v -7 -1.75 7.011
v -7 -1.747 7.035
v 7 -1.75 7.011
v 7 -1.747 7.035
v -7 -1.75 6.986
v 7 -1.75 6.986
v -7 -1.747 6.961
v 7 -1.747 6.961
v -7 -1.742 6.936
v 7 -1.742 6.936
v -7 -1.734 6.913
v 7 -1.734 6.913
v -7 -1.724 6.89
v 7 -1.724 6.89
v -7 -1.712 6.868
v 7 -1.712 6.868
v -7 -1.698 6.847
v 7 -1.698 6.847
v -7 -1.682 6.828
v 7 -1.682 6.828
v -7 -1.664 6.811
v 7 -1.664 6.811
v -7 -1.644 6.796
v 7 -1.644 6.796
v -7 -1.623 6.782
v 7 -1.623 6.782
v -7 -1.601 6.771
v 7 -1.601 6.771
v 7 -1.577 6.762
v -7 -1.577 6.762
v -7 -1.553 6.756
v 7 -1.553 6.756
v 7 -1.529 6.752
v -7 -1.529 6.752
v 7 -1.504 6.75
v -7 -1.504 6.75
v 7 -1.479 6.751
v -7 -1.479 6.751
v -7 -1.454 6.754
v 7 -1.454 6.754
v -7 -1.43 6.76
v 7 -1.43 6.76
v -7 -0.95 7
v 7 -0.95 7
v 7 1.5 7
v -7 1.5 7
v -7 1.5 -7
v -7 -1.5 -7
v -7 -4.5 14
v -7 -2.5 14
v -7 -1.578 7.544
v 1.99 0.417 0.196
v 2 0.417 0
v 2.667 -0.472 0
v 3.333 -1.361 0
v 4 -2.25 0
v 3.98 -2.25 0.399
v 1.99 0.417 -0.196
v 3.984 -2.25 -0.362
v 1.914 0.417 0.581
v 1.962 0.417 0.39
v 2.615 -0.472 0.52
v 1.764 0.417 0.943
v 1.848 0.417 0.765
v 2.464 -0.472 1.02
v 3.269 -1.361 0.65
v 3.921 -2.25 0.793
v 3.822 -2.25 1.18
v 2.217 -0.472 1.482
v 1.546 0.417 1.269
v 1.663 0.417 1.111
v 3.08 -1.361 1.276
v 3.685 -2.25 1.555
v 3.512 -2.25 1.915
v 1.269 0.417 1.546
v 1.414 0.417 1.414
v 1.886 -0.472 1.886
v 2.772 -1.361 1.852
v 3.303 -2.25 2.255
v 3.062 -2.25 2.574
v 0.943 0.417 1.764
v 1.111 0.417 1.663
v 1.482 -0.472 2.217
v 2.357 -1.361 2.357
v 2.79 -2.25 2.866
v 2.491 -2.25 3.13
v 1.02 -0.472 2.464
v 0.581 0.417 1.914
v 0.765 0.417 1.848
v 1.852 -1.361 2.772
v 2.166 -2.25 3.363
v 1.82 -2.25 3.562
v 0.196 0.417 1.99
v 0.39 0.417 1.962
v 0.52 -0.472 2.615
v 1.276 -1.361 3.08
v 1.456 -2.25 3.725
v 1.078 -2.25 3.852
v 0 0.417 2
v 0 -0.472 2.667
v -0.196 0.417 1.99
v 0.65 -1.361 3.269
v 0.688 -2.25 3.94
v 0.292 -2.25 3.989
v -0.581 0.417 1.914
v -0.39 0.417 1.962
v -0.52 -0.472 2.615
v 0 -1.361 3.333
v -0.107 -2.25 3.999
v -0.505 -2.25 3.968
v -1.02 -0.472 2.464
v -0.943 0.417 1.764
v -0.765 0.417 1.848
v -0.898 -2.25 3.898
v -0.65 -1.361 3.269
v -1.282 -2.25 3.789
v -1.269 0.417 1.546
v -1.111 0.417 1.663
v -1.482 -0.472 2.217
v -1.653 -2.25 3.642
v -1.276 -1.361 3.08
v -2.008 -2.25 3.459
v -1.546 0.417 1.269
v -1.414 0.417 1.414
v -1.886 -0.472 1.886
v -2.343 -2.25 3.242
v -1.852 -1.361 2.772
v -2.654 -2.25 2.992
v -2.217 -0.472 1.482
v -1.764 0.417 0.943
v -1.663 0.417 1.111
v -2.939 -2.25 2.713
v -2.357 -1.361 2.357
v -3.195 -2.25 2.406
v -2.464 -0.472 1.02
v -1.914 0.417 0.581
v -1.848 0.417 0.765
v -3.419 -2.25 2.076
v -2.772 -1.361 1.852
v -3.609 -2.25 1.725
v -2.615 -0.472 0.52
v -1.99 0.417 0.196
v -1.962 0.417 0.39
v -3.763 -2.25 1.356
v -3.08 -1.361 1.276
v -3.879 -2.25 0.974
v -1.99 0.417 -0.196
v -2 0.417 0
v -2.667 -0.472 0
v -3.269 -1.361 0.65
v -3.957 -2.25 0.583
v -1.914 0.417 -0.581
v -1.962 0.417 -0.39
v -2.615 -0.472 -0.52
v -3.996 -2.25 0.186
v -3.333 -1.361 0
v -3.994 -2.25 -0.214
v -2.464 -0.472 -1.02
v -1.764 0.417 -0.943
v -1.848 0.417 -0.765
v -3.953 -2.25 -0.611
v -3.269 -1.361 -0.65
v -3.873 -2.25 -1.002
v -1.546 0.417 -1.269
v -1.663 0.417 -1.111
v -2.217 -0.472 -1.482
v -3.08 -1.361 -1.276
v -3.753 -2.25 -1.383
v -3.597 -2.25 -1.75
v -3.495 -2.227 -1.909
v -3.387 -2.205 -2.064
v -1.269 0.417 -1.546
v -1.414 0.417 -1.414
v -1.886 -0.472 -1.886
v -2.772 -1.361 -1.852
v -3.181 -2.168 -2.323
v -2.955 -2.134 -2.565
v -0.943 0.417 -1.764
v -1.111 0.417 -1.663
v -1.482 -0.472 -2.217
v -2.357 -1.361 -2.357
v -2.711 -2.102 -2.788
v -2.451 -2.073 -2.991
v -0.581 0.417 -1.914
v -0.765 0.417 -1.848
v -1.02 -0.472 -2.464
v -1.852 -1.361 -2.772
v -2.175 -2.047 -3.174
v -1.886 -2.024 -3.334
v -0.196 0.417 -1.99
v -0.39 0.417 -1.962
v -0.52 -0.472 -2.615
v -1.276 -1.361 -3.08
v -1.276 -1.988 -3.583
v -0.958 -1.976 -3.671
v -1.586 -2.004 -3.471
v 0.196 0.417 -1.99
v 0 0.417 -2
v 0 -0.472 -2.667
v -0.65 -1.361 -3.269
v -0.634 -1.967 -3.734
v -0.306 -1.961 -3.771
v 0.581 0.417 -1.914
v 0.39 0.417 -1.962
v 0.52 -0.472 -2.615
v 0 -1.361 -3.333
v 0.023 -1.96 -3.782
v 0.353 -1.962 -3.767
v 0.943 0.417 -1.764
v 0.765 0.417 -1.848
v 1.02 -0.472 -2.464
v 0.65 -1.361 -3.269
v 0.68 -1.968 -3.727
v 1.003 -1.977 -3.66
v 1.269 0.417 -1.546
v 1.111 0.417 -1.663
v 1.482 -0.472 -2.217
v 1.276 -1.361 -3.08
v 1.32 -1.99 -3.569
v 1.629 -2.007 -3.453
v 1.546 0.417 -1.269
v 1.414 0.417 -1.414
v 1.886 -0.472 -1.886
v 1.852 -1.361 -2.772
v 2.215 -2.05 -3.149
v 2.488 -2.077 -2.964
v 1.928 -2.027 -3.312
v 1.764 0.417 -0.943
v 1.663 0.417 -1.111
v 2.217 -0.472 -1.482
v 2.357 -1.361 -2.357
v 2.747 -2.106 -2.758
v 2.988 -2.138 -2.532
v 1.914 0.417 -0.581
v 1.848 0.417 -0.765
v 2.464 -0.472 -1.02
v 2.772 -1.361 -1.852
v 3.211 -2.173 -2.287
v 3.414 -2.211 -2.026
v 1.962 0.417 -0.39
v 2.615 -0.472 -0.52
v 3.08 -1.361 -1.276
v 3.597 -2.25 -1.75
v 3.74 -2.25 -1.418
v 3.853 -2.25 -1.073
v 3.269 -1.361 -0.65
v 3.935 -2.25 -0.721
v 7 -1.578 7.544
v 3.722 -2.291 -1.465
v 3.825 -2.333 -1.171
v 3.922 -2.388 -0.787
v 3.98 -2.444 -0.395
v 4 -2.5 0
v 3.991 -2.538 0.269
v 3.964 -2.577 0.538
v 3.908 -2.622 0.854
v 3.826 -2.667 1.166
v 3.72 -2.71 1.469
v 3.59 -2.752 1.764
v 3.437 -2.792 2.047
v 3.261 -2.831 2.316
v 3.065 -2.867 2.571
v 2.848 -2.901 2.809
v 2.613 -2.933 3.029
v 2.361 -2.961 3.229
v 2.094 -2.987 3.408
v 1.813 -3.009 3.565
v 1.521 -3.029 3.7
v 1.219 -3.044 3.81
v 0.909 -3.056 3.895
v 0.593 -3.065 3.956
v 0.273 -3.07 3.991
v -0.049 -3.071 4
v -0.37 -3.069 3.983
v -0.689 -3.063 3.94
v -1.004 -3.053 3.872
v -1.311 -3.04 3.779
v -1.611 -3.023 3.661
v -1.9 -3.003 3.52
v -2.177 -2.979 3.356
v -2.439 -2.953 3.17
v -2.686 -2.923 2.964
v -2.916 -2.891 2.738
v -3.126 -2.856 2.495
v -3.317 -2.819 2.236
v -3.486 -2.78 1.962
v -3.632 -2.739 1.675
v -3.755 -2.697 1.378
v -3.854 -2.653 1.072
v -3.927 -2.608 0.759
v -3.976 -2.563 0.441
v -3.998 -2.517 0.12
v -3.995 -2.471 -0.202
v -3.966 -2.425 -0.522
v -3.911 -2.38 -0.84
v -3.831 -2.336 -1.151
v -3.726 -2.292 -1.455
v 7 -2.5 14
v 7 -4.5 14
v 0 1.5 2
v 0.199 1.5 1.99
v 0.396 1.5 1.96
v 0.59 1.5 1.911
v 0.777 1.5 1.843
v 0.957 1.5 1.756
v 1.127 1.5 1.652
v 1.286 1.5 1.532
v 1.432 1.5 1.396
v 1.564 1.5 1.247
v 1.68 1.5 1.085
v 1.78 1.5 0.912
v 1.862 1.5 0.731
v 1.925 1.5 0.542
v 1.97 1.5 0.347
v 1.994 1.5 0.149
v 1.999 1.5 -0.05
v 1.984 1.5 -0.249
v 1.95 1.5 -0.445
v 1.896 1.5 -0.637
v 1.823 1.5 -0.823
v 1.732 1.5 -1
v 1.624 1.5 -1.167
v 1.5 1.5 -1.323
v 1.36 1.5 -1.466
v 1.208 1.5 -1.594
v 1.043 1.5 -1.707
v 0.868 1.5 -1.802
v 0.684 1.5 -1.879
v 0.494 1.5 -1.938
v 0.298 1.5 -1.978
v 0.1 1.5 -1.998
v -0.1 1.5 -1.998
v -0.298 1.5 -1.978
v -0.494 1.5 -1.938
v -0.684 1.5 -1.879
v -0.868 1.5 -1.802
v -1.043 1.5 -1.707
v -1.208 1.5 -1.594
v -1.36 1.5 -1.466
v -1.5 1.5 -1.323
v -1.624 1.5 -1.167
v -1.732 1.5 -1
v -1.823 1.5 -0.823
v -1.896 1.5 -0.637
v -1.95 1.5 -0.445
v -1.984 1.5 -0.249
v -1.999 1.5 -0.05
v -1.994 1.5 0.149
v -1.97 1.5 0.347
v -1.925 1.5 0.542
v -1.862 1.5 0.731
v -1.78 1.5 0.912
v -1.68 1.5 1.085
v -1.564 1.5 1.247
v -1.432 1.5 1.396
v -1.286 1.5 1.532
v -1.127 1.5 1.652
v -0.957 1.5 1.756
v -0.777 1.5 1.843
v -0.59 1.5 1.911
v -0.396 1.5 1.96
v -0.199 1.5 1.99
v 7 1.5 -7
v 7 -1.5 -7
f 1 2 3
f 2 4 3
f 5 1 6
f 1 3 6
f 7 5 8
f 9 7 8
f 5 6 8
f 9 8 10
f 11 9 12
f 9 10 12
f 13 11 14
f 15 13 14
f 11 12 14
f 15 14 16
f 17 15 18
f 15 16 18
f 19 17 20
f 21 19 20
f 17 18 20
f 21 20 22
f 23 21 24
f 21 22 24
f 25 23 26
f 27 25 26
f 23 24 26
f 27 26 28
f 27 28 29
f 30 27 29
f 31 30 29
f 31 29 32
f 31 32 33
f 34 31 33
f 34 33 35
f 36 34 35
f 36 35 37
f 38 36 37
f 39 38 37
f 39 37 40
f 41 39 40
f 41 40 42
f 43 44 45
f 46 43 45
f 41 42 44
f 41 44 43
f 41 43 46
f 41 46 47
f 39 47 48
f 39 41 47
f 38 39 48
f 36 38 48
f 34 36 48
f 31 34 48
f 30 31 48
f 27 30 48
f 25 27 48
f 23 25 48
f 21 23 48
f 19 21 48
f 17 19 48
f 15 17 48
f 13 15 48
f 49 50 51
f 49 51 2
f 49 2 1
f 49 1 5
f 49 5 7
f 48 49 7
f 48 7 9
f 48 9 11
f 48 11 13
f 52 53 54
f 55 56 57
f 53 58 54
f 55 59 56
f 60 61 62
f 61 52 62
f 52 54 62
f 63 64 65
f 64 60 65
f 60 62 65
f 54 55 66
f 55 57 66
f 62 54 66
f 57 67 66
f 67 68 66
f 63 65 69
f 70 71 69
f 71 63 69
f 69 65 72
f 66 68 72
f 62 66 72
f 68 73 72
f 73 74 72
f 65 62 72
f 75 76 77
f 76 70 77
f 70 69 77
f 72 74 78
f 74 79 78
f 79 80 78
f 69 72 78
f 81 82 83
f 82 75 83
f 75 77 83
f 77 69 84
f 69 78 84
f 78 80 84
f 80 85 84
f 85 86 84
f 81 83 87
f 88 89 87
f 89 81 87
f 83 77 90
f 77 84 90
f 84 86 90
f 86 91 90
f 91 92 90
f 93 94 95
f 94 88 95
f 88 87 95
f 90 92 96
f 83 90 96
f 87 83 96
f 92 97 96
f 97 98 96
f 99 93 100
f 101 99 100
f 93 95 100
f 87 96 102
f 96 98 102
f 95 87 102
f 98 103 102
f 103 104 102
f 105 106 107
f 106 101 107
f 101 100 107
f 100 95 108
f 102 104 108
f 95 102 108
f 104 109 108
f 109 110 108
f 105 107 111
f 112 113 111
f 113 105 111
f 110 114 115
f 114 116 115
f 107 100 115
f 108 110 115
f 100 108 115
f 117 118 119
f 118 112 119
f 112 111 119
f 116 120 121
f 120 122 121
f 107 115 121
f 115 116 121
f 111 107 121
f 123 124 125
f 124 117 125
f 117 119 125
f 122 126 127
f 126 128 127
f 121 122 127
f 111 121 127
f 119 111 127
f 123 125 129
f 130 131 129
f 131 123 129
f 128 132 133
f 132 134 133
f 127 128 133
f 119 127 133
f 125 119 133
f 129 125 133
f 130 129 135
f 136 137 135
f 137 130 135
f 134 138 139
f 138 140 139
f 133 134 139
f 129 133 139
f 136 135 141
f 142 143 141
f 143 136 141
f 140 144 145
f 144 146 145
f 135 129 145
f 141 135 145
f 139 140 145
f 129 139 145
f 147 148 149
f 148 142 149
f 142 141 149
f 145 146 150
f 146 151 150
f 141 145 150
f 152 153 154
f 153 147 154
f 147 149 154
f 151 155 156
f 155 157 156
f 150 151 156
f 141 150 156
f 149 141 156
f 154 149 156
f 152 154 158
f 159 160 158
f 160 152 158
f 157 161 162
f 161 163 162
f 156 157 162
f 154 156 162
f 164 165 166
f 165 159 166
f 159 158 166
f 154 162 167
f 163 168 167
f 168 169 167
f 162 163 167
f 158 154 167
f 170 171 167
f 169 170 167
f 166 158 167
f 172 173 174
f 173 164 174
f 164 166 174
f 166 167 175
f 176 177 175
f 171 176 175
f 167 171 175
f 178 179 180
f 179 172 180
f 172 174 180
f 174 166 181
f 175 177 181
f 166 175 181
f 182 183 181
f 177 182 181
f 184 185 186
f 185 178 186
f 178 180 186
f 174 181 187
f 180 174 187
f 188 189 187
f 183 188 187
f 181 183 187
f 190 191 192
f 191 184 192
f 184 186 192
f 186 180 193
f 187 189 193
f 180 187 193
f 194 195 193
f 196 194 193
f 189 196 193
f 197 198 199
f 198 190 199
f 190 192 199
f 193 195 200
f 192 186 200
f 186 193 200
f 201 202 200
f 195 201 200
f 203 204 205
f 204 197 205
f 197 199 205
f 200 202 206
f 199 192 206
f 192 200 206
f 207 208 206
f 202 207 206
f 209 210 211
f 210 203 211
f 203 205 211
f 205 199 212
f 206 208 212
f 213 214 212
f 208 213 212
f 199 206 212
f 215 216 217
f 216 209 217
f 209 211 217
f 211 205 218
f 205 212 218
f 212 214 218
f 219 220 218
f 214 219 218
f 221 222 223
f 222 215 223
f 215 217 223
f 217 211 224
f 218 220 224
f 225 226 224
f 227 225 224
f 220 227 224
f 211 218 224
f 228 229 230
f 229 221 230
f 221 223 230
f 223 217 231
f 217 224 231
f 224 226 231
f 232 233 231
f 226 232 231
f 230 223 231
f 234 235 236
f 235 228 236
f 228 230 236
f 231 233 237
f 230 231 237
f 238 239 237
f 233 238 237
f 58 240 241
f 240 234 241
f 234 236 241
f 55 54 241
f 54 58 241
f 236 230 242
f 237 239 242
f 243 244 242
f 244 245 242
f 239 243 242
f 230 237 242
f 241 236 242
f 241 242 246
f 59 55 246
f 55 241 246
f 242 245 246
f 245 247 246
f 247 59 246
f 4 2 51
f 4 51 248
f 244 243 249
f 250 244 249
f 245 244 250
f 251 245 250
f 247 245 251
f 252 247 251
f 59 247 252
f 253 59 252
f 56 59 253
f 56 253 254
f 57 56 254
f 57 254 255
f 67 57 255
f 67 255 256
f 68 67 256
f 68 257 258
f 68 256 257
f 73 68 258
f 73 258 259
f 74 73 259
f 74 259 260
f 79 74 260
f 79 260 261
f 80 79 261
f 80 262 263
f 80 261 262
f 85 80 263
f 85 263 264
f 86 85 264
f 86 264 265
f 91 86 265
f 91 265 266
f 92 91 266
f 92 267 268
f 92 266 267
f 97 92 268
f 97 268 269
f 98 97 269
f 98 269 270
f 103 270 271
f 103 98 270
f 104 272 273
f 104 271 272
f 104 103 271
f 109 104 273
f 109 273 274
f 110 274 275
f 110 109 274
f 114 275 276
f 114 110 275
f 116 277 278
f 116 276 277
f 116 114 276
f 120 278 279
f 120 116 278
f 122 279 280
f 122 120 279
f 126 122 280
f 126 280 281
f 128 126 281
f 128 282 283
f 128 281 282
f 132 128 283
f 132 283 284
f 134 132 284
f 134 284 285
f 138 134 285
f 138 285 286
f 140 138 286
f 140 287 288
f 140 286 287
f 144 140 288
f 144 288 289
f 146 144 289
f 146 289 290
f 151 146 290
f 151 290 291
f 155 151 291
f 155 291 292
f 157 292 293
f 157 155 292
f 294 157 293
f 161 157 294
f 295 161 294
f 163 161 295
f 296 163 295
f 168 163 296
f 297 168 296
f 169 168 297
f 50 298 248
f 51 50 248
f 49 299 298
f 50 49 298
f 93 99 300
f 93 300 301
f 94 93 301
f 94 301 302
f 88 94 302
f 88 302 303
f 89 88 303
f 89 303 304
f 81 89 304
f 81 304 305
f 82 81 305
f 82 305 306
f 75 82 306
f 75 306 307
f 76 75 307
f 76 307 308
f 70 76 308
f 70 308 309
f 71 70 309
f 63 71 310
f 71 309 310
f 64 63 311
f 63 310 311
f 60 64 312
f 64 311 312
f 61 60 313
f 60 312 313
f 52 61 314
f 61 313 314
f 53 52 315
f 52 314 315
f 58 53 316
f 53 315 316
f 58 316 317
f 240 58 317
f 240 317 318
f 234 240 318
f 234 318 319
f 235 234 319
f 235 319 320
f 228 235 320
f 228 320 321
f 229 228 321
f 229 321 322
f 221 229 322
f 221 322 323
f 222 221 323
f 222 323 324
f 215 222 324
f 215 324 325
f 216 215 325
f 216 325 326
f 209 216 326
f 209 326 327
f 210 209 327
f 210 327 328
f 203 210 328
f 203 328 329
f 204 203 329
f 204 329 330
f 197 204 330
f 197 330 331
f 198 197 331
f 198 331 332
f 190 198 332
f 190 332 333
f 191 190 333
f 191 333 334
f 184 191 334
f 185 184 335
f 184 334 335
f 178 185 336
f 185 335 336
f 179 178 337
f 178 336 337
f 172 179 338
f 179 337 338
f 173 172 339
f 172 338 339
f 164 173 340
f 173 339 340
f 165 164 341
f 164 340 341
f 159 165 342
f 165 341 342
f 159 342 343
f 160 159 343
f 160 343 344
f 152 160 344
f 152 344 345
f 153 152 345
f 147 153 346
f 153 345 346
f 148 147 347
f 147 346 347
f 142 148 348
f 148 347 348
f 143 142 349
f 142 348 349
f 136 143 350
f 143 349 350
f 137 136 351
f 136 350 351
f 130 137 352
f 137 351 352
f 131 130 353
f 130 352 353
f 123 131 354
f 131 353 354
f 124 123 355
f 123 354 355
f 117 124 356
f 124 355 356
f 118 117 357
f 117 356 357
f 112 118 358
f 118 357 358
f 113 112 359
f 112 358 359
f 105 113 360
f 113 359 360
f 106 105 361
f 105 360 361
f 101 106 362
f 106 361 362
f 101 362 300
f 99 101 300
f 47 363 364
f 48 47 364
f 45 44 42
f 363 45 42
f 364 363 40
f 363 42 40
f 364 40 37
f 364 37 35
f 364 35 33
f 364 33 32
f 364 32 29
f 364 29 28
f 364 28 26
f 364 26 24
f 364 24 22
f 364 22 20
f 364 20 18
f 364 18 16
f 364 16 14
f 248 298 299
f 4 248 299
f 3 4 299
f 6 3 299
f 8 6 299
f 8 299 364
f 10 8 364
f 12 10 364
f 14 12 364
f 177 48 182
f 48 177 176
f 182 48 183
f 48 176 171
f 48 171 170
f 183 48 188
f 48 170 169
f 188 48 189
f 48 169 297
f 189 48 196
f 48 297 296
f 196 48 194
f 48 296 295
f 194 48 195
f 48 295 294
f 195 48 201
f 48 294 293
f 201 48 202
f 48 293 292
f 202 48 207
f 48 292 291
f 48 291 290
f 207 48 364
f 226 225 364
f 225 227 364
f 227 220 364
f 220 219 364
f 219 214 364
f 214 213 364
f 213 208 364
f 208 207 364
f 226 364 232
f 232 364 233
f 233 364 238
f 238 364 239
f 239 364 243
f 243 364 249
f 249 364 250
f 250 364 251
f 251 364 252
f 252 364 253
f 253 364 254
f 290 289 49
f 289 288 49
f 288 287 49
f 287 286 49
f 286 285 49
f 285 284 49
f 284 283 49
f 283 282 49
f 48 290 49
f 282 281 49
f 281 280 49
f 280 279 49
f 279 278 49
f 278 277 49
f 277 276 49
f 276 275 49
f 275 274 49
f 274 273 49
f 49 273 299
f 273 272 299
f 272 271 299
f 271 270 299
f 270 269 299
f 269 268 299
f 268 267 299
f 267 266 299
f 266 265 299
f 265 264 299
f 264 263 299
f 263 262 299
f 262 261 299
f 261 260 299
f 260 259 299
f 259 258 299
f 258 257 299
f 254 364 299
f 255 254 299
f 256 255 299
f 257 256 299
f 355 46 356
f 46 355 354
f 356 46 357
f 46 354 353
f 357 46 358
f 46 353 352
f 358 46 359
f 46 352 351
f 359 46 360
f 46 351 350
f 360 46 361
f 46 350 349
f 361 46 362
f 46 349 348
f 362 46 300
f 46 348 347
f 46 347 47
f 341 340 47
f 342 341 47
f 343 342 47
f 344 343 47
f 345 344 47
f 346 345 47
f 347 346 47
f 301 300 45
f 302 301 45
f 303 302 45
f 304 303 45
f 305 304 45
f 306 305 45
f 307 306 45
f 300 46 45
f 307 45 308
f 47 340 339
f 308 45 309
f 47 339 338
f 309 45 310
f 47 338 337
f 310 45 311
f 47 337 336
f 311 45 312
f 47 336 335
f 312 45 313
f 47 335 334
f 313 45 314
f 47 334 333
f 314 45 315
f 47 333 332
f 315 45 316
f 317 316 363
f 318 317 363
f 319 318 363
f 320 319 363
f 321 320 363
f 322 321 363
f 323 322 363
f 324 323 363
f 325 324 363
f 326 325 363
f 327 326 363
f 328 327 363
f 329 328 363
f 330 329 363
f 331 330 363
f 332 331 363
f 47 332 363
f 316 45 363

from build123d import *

# Parameters (mm, degrees)
SKETCH003_R     = 1.75
SKETCH004_R     = 4
SKETCH005_R     = 4
PAD001_DEPTH    = 2
PAD_DEPTH       = 7
SKETCH001_R     = 0.25
POCKET_DEPTH    = 14.001
SKETCH002_R     = 2
POCKET001_DEPTH = 6.001
CHAMFER_SIZE    = 0.3


with BuildPart() as schraubenkopf:
    # Sketch003 → Loft section 0
    with BuildSketch(Plane.XZ.offset(-0.75)):
        Circle(SKETCH003_R)
    # Sketch004 → Loft section 1
    with BuildSketch(Plane.XZ.offset(2.25)):
        Circle(SKETCH004_R)
    loft()

    # Sketch005 → Pad001 (new body)
    with BuildSketch(Plane.XZ.offset(2.25)):
        Circle(SKETCH005_R)
    extrude(amount=PAD001_DEPTH)


with BuildPart() as halterung_unten:
    # Sketch → Pad (new body, symmetric)
    with BuildSketch(Plane.YZ):
        Polygon((-4.5, 14), (-2.5, 14), (-1.5, 7), (1.5, 7), (1.5, -7), (-1.5, -7), align=None)
    extrude(amount=PAD_DEPTH, both=True)

    # Sketch001 → Pocket (cut, through all)
    with BuildSketch(Plane.YZ.offset(7)):
        with Locations((-1.5, 7)):
            Circle(SKETCH001_R)
    extrude(amount=-POCKET_DEPTH, mode=Mode.SUBTRACT)

    # Sketch002 → Pocket001 (cut, through all)
    with BuildSketch(Plane.ZX.offset(1.5)):
        Circle(SKETCH002_R)
    extrude(amount=-POCKET001_DEPTH, mode=Mode.SUBTRACT)

    # Cut: cut Schraubenkopf
    add(schraubenkopf.part, mode=Mode.SUBTRACT)

    # Chamfer
    chamfer_edges = [halterung_unten.edges().sort_by_distance(p)[0] for p in [
        (0, -1.535355, 7.247487),
        (0, -1.25, 7),
    ]]
    chamfer(chamfer_edges, length=CHAMFER_SIZE)


solid = halterung_unten.part
